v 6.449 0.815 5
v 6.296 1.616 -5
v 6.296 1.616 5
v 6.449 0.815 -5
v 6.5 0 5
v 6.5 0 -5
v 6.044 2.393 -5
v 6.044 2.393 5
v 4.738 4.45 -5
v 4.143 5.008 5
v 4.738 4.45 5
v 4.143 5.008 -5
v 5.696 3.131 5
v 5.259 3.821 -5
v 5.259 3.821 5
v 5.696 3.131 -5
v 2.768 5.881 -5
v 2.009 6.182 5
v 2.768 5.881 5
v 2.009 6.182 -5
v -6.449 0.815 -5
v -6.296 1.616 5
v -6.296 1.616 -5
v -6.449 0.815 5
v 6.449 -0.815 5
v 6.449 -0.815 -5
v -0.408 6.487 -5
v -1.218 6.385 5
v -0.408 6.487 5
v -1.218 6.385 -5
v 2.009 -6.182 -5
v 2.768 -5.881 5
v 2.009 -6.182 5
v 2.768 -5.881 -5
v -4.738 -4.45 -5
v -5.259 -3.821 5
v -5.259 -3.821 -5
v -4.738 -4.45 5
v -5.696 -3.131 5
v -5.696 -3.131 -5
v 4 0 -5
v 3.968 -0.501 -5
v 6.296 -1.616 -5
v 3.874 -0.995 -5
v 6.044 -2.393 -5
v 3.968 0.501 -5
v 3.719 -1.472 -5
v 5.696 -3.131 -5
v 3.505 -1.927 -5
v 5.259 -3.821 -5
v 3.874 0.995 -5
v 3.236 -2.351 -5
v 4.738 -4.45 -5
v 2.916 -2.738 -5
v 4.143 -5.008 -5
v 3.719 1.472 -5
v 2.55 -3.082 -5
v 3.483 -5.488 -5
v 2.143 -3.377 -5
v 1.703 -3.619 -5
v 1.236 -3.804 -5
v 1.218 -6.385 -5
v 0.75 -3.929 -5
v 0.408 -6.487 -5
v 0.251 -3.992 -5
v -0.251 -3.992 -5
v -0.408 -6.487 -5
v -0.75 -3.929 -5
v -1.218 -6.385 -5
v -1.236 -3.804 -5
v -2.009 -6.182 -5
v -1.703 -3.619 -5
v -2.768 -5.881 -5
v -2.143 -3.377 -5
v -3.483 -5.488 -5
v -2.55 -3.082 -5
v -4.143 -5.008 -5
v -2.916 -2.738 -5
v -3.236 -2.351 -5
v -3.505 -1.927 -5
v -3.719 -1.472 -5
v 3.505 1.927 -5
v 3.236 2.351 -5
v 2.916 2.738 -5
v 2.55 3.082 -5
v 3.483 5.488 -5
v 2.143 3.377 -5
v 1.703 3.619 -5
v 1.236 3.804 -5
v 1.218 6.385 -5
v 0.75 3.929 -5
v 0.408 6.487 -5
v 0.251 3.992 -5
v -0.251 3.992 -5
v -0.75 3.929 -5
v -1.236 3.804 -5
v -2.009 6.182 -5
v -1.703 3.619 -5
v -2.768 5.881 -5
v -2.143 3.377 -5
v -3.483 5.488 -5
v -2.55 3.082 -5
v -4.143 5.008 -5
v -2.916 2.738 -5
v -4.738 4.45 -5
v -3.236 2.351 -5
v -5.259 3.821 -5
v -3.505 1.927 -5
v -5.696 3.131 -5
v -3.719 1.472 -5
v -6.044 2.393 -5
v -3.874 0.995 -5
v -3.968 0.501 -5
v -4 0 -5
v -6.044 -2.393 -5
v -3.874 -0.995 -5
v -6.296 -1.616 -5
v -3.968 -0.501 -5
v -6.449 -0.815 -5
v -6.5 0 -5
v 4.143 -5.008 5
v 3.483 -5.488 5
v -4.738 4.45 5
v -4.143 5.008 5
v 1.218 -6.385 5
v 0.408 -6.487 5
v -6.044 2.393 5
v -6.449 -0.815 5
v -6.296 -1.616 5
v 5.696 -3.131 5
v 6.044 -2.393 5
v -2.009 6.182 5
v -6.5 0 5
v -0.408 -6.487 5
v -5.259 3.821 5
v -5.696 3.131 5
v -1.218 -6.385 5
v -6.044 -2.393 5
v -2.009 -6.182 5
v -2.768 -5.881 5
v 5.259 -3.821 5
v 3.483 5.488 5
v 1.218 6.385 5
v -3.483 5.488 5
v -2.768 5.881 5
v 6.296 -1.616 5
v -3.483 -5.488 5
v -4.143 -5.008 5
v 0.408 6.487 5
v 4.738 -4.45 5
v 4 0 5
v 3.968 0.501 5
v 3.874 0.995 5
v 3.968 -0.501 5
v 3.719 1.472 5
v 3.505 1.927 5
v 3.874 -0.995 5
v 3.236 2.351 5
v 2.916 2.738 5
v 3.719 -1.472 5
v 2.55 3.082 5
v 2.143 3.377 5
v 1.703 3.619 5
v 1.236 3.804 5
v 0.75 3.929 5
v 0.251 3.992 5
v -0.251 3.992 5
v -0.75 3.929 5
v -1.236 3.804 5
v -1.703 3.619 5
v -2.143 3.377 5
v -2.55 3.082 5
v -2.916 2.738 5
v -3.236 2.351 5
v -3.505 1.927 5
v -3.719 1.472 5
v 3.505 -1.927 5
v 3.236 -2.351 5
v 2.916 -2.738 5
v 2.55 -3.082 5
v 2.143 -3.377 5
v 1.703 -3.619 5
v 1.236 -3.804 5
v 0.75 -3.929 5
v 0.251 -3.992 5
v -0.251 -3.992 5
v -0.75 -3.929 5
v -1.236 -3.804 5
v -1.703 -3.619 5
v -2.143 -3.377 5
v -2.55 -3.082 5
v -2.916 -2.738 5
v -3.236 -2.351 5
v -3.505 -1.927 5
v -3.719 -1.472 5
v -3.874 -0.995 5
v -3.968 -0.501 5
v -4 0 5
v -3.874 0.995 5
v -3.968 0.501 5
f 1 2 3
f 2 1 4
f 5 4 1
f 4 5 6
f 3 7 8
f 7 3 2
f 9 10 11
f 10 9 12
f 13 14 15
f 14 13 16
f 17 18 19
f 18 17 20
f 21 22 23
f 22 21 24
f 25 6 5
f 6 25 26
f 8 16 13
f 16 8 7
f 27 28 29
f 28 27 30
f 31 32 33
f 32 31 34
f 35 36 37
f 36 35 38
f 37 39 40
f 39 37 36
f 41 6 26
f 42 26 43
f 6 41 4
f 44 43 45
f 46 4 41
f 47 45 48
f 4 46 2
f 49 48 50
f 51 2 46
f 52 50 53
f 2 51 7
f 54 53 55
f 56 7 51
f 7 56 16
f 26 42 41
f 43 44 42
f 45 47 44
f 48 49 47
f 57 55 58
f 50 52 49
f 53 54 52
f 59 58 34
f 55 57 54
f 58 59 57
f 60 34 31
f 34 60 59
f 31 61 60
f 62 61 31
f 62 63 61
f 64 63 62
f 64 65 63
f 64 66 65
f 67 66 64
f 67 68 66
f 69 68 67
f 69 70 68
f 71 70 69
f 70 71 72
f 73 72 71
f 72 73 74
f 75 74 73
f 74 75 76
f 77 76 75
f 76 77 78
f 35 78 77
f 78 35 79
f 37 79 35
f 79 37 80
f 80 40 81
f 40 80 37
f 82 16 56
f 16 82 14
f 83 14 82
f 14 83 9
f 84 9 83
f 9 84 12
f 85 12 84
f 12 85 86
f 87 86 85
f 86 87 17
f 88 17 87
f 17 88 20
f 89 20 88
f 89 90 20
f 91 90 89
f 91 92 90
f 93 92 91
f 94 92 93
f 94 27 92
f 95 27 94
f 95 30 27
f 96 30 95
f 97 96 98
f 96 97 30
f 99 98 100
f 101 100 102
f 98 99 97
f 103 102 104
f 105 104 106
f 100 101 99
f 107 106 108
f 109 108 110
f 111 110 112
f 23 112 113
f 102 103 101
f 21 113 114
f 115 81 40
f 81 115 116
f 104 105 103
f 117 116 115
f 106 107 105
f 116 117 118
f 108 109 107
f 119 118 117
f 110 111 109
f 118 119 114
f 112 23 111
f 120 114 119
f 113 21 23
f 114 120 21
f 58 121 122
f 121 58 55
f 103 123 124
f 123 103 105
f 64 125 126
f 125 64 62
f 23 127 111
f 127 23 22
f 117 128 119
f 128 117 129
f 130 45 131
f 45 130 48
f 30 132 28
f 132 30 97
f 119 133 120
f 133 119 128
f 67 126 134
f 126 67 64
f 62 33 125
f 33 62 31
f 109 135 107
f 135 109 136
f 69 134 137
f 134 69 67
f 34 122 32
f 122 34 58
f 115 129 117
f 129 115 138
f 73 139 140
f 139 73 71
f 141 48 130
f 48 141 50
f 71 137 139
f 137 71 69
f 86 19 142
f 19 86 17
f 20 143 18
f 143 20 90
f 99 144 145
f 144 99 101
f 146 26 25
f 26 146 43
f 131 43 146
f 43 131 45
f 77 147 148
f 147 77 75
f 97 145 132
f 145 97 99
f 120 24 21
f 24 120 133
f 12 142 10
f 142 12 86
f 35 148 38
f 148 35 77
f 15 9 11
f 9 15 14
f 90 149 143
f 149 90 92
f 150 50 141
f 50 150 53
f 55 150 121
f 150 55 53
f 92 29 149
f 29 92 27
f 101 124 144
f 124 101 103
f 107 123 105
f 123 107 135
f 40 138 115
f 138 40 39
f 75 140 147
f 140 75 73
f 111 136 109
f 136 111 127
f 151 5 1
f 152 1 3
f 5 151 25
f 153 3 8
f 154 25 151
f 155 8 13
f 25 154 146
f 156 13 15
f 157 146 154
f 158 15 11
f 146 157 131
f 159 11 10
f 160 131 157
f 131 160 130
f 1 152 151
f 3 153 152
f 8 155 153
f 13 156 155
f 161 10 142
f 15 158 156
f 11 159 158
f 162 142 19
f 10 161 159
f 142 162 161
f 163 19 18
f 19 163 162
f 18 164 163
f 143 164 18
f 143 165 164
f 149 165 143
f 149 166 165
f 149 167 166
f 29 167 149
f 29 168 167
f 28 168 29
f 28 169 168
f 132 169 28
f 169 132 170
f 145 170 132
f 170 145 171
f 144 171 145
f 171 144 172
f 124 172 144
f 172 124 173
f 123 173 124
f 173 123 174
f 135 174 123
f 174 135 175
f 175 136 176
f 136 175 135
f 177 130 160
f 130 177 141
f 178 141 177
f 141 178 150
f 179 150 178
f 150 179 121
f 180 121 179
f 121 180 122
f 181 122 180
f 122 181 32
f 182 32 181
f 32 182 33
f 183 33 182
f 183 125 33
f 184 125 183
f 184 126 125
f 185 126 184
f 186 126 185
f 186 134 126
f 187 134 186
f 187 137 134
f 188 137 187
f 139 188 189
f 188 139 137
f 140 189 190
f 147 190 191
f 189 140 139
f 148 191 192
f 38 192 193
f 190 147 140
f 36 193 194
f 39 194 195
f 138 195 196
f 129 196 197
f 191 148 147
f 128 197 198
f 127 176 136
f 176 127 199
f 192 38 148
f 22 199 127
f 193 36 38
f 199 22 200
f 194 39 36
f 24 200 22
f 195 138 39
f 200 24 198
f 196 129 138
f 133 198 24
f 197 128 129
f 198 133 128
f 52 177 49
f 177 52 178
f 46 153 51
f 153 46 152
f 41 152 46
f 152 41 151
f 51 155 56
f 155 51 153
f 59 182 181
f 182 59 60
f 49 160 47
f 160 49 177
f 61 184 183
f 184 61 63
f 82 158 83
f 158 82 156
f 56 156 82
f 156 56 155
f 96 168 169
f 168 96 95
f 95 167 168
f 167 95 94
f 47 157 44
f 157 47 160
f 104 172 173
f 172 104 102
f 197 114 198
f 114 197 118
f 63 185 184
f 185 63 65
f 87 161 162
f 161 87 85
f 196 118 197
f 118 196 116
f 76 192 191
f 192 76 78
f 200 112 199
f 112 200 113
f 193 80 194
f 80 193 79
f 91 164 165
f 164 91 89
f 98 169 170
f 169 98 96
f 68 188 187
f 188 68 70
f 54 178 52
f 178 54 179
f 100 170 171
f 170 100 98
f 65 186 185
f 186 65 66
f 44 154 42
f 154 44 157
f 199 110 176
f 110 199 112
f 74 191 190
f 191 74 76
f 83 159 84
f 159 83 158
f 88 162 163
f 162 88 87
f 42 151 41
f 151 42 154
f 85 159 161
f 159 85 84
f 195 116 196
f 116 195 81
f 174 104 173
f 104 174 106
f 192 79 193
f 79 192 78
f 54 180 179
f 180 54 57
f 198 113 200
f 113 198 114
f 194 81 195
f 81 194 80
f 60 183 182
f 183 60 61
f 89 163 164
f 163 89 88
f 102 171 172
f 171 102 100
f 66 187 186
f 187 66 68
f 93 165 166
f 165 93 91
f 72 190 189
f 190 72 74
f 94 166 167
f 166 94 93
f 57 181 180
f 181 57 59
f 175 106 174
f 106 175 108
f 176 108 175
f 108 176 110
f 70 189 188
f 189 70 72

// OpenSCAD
$fn = 50;


difference() {
	union() {
		translate(v = [0, 0, -5.0000000000]) {
			cylinder(h = 10, r = 6.5000000000);
		}
	}
	union() {
		translate(v = [0, 0, -100.0000000000]) {
			cylinder(h = 200, r = 4.0000000000);
		}
	}
}
